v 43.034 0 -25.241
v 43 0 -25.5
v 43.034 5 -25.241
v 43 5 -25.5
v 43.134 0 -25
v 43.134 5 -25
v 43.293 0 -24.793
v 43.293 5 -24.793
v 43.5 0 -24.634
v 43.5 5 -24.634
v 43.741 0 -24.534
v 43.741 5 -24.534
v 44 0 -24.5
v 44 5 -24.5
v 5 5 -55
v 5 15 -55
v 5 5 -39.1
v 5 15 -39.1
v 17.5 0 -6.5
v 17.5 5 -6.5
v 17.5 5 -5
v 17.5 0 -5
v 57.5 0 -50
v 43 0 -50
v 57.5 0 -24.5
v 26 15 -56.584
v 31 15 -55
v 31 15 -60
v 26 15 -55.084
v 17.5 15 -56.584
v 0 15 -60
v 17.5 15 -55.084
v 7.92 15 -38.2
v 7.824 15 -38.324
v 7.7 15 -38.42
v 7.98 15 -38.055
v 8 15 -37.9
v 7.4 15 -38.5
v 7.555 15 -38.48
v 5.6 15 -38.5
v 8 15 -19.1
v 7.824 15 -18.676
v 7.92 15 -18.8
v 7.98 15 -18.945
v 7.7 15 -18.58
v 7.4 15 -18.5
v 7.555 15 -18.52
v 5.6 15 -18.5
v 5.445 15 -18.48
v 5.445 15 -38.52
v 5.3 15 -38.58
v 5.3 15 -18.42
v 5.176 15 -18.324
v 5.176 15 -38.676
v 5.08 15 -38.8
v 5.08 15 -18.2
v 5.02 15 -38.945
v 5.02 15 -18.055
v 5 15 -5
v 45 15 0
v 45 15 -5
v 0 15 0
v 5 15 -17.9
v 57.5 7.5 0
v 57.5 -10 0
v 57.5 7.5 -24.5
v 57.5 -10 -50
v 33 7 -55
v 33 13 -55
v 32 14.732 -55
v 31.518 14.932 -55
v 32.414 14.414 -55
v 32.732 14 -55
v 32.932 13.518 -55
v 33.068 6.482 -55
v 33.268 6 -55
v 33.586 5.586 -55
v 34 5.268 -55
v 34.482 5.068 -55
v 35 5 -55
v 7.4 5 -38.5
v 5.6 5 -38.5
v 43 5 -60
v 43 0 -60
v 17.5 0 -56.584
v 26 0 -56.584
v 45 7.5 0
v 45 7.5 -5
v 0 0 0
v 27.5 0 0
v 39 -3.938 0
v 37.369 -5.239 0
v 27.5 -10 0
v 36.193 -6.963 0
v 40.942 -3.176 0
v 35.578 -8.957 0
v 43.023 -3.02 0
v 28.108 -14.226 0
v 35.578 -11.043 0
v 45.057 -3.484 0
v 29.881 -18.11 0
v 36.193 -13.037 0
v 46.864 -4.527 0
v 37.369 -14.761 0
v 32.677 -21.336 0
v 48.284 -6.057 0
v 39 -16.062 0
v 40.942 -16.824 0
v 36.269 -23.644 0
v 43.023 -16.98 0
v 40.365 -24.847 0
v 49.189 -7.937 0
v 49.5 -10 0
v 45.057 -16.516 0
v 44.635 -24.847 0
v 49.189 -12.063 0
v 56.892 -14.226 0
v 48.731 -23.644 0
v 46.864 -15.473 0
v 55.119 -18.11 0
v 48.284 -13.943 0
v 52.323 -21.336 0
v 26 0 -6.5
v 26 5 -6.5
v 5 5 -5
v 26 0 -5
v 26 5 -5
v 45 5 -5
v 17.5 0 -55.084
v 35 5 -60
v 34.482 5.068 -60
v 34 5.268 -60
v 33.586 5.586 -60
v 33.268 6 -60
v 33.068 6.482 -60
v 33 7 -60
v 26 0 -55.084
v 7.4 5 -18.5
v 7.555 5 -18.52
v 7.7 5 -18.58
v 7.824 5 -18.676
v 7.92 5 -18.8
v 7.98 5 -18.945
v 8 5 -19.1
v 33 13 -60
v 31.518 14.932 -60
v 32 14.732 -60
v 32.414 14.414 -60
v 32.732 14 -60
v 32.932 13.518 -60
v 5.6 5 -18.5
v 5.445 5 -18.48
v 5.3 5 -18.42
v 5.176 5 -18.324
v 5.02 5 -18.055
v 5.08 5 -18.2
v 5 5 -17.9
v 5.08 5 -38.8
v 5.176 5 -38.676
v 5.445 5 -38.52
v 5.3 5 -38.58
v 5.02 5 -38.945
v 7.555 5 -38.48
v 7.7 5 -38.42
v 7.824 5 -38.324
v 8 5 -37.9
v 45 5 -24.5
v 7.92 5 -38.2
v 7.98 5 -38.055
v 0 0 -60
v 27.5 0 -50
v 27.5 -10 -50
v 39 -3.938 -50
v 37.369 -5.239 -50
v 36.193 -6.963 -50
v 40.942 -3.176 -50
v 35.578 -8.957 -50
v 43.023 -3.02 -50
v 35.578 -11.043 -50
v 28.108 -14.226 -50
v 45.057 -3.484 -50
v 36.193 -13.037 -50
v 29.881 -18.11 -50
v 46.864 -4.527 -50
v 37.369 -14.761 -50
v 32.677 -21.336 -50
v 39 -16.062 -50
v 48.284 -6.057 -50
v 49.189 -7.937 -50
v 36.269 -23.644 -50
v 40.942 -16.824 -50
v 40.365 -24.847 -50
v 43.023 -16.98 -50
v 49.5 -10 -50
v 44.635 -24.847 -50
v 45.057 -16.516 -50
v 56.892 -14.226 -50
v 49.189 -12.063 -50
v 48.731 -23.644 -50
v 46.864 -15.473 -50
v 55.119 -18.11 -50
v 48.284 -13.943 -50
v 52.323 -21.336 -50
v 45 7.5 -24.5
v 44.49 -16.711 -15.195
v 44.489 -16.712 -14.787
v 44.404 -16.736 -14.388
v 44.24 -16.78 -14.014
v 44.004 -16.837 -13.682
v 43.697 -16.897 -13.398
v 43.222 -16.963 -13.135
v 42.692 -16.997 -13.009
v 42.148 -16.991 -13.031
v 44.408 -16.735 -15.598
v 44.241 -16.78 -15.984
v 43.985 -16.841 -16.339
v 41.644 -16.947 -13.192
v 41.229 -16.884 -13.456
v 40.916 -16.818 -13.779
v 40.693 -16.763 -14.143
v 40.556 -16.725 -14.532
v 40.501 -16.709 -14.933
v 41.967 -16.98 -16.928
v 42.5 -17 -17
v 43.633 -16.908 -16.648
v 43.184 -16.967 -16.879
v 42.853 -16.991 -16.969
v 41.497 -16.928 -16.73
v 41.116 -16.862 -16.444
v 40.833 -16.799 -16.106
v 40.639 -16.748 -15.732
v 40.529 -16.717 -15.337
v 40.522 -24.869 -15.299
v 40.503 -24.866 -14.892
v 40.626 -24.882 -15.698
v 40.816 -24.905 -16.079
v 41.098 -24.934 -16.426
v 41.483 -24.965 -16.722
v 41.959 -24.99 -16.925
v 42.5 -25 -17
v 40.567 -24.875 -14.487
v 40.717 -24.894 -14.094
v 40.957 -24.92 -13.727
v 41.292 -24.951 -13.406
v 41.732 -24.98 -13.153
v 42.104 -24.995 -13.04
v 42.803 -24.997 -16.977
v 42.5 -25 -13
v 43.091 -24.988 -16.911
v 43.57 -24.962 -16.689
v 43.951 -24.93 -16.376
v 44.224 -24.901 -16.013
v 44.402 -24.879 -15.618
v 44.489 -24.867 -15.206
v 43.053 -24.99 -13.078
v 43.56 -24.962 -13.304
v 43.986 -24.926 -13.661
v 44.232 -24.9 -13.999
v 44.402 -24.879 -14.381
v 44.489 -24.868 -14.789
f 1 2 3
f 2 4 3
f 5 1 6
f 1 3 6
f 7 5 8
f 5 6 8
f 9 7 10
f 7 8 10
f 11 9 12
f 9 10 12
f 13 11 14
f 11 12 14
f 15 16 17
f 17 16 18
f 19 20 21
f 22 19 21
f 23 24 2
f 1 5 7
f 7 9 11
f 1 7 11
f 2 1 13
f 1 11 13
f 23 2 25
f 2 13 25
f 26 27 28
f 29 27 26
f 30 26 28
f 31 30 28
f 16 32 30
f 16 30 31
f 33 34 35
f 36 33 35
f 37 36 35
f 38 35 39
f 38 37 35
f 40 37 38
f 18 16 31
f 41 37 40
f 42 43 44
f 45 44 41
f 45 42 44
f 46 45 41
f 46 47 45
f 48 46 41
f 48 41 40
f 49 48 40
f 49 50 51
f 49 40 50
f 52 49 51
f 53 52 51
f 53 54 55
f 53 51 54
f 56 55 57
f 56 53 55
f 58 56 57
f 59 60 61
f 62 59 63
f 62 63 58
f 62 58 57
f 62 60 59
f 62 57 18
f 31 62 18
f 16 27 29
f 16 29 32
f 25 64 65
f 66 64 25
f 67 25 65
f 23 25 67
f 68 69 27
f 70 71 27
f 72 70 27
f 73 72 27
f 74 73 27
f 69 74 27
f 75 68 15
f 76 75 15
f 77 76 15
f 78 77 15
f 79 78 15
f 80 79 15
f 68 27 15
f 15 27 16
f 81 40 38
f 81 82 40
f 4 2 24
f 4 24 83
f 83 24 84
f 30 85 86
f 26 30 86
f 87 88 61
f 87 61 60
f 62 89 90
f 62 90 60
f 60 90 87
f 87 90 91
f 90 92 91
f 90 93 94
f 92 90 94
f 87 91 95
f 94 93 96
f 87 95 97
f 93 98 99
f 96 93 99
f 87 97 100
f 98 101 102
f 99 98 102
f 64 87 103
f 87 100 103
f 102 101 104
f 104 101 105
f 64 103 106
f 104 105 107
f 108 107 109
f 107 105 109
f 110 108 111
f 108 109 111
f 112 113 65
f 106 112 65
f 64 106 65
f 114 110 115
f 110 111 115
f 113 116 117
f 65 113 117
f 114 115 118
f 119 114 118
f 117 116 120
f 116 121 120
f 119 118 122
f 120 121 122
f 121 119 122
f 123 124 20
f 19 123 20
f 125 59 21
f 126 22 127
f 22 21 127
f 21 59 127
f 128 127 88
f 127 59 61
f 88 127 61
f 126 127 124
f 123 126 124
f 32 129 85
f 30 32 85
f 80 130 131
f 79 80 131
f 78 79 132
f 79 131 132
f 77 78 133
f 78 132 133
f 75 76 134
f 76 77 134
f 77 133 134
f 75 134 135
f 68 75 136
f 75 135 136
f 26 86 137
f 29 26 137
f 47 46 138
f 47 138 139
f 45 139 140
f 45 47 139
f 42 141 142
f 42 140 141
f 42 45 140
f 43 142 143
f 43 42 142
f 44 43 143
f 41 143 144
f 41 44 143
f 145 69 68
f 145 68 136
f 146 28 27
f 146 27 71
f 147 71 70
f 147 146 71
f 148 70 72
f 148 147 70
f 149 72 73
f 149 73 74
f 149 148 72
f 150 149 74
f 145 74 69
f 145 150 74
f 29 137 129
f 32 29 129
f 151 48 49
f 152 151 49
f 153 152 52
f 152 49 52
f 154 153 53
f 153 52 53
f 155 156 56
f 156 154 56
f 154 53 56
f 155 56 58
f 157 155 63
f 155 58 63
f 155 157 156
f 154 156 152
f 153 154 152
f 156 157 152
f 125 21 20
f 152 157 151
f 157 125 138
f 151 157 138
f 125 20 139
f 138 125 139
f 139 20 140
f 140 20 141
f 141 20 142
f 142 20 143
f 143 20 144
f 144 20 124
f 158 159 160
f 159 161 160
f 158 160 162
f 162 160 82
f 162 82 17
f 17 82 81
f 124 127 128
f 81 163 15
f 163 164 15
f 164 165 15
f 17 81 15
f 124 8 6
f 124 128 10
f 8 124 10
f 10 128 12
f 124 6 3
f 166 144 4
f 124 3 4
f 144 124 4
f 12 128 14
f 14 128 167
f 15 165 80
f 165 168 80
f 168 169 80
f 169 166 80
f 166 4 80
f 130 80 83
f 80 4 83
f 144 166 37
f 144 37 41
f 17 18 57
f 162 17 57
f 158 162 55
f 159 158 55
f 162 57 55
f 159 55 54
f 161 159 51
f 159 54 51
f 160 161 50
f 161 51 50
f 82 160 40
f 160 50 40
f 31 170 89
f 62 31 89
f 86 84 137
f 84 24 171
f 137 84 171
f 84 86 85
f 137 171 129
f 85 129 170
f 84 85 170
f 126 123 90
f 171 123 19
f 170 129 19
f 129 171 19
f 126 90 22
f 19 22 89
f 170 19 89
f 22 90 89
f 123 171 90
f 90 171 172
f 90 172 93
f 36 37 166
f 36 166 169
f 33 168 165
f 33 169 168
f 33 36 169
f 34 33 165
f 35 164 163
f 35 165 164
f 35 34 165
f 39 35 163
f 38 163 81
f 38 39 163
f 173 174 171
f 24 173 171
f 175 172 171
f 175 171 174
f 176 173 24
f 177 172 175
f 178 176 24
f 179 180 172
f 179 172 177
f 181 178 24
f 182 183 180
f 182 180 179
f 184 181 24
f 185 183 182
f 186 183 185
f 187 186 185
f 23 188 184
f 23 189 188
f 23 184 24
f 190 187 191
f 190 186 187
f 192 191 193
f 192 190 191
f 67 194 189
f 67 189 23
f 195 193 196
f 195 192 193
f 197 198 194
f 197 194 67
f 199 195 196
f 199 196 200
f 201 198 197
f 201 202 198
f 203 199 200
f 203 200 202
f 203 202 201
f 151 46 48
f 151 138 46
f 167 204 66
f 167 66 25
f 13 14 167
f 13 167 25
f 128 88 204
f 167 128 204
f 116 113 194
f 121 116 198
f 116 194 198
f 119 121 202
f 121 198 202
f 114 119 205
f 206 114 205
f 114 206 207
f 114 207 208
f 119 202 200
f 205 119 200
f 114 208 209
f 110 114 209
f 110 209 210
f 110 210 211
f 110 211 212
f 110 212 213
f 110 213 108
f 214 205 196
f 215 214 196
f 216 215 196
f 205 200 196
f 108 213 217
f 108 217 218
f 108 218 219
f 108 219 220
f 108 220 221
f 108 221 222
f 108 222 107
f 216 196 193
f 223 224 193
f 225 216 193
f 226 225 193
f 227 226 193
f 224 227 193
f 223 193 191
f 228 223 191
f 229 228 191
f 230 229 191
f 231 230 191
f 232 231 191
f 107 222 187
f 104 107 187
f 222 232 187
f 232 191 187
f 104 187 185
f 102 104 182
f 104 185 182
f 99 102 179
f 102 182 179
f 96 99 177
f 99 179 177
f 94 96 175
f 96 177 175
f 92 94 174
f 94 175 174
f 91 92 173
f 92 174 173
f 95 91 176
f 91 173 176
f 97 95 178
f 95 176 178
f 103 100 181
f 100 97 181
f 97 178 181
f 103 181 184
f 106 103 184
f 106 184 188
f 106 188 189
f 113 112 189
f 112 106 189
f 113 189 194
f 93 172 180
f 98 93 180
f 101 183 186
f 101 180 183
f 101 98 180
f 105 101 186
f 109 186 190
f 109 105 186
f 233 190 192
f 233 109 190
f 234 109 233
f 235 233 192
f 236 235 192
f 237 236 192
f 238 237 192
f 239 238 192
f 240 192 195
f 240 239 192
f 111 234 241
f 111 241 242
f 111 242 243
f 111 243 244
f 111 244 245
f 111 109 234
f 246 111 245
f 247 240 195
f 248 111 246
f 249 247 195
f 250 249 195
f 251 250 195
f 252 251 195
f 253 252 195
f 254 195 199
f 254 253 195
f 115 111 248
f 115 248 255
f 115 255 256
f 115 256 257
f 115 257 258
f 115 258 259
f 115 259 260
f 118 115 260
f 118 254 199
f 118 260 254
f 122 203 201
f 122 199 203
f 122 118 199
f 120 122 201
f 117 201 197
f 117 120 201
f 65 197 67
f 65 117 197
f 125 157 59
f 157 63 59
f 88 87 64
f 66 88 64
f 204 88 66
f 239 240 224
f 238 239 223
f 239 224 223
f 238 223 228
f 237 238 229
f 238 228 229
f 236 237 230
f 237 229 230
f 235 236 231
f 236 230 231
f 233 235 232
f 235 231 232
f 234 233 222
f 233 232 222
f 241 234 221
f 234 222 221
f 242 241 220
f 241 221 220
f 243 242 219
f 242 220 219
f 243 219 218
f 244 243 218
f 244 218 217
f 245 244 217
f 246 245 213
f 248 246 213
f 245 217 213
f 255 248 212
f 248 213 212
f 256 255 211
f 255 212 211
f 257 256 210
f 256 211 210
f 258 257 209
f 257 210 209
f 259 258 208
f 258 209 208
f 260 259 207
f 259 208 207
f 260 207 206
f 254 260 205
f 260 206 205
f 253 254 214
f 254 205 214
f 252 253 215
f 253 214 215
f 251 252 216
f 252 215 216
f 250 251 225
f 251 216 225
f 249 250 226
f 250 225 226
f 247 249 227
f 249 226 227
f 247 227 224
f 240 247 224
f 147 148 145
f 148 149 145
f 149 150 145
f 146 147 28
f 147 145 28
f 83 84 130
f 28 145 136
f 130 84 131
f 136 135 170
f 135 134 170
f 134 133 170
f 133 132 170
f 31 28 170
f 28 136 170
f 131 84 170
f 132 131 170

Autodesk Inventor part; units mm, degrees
ref_plane "YZ Plane" through (0, 0, 0) normal (1, 0, 0) x (0, 1, 0)
ref_plane "XZ Plane" through (0, 0, 0) normal (0, 1, 0) x (-1, 0, 0)
sketch "Sketch1" plane through (0, 0, 0) normal (0, 1, 0) x (-1, 0, 0)
  line L0 (0, 0) -> (0, -60)
  line L1 (0, 0) -> (-50, 0)
  line L2 (-5, -60) -> (-5, -5)
  line L3 (-5, -5) -> (-50, -5)
  line L4 (-47.5, 69.0442) -> (-47.5, -71.5611) construction
  line L5 (-50, 0) -> (-55, 0)
  line L6 (-55, 0) -> (-55, -50)
  line L7 (-55, -50) -> (-75, -50)
  line L8 (-75, -50) -> (-75, -60)
  line L9 (-75, -60) -> (-45, -60)
  line L10 (-5, -60) -> (-21, -60)
  circle A0 centre (-47.5, -73.124) radius 8.5
  line L11 (16.7028, -43.5) -> (-102.7124, -43.5) construction
  line L12 (-45, -26.5) -> (-50, -26.5)
  line L13 (-50, -26.5) -> (-50, -60.5)
  line L14 (-50, -60.5) -> (-45, -60.5)
  line L15 (-45, -60.5) -> (-45, -26.5)
  line L16 (-45, -43.5) -> (-50, -43.5) construction
  line L17 (-21, -60) -> (-21, -67.124)
  line L18 (-21, -67.124) -> (-30, -67.124)
  line L19 (-39, -67.124) -> (-39, -60)
  line L20 (-39, -60) -> (-45, -60) construction
  line L21 (-15.952, -100.4576) -> (-35.952, -100.4576)
  line L22 (-35.952, -108.4576) -> (-15.952, -108.4576)
  line L23 (-15.952, -108.4576) -> (-15.952, -100.4576)
  line L24 (-15.952, -73.124) -> (-76.4965, -73.124) construction
  line L25 (-30, -57.9879) -> (-30, -83.8601) construction
  line L26 (-25.952, -100.4576) -> (-25.952, -108.4576) construction
  line L27 (-45, -31) -> (-50, -31) construction
  line L28 (-50, -31) -> (-50, -56)
  line L29 (-50, -56) -> (-45, -56) construction
  line L30 (-45, -56) -> (-45, -31)
  line L31 (-45, -56) -> (-50, -56)
  line L32 (-45, -65.1391) -> (-45, -56)
  line L33 (-45, -56) -> (-50, -56)
  line L34 (-50, -56) -> (-50, -65)
  line L35 (-50, -65) -> (-45, -65)
  line L36 (-45, -65) -> (-45, -56)
  arc A1 (-35.952, -108.4576) -> (-35.952, -100.4576) centre (-43.452, -104.4576) ccw
  line L37 (-30, -67.124) -> (-39, -67.124)
  point P0 (-47.5, -43.5)
  point P1 (-30, -73.124)
  dimension "d9" = 17
  dimension "d0" = 60
  dimension "d1" = 50
  dimension "d2" = 5
  dimension "d3" = 47.5
  dimension "d4" = 5
  dimension "d5" = 50
  dimension "d6" = 20
  dimension "d7" = 30
  dimension "d10" = 38.5
  dimension "d11" = 5
  dimension "d12" = 34
  dimension "d13" = 20
  dimension "d14" = 8
  dimension "d57" = 25
  dimension "d58" = 4.5
  dimension "d59" = 5
  dimension "d60" = 9
  dimension "d61" = 17
  dimension "d62" = 9
  dimension "d63" = 9
  dimension "d64" = 9
  dimension "d65" = 6
sketch "Sketch2" plane through (0, 0, 0) normal (0, 1, 0) x (-1, 0, 0)
  line L0 (0, 0) -> (-45, 0)
  line L1 (-45, -60) -> (0, -60)
  line L2 (0, -60) -> (0, 0)
  line L3 (-5, -60) -> (-21, -60) projected
  line L4 (-30, -67.124) -> (-39, -67.124) projected
  line L5 (-57.5, -67.124) -> (-72, -67.124)
  line L6 (-72, -67.124) -> (-72, -59.124)
  line L7 (-72, -59.124) -> (-60, -59.124)
  line L8 (-60, -59.124) -> (-60, 0)
  line L9 (-57.5, -67.124) -> (-57.5, -60)
  line L10 (-45, -60.5) -> (-45, -26.5) projected
  line L11 (-45, -60) -> (-45, 0)
  point P0 (-60, -55)
  point P1 (-60, -67.124)
  dimension "d16" = 57.5
  dimension "d73" = 8
extrude "Extrusion1" add sketch "Sketch2" along normal blind 15
sketch "Sketch3" plane through (0, 15, 0) normal (0, 1, 0) x (1, 0, 0)
  line L0 (5, 5) -> (55, 5)
  line L1 (55, 5) -> (55, 55)
  line L2 (55, 55) -> (5, 55)
  line L3 (5, 55) -> (5, 5)
  line L4 (0, 0) -> (45, 0) projected
  line L5 (0, 60) -> (0, 0) projected
  point P0 (60, 0)
  dimension "d23" = 5
  dimension "d24" = 5
  dimension "d25" = 50
  dimension "d26" = 50
extrude "Extrusion2" cut sketch "Sketch3" against normal blind 10
sketch "Sketch5" plane through (0, 0, 0) normal (0, -1, 0) x (1, 0, 0)
  line L0 (45, -60) -> (0, -60) projected
  line L1 (45, -60.5) -> (45, -26.5) projected
  line L2 (5, -60) -> (5, -5) projected
  line L3 (50, -26.5) -> (50, -60.5) projected
  line L4 (45, -26.5) -> (50, -26.5) projected
  line L5 (50, -60.5) -> (45, -60.5) projected
  line L6 (52, -60) -> (52, -24.5)
  line L7 (52, -24.5) -> (43, -24.5)
  line L8 (43, -24.5) -> (43, -60)
  line L9 (52, -60.5) -> (52, -60)
  line L10 (52, -60) -> (43, -60)
  point P0 (80, -60)
  point P1 (57.5, -60)
  dimension "d30" = 40
  dimension "d31" = 2
extrude "Extrusion3" cut sketch "Sketch5" against normal through all contours L0 L8 L7 L6 L10 L3 L4 L1 | L1 L4 L3 L10
sketch "Sketch8" plane through (0, 5, 0) normal (0, 1, 0) x (1, 0, 0)
  line L0 (36, 11.5) -> (39, 11.5)
  line L1 (39, 11.5) -> (39, 43.5)
  line L2 (39, 43.5) -> (36, 43.5)
  line L3 (36, 43.5) -> (36, 11.5)
  line L4 (45, 60.5) -> (45, 26.5) projected
  line L5 (-16.7028, 43.5) -> (102.7124, 43.5) construction
  point P0 (0, 0)
  point P1 (47.5, 43.5)
  dimension "d45" = 6
  dimension "d46" = 32
  dimension "d47" = 3
extrude "Extrusion5" [suppressed]
sketch "Sketch9" plane through (0, 5, 0) normal (0, 1, 0) x (1, 0, 0)
  line L0 (36, 43.5) -> (39, 43.5) projected
  line L1 (5, 5) -> (5, 55) projected
  line L2 (8, 18.5) -> (5, 18.5)
  line L3 (5, 18.5) -> (5, 38.5)
  line L4 (5, 38.5) -> (8, 38.5)
  line L5 (8, 38.5) -> (8, 18.5)
  point P0 (0, 0)
  dimension "d50" = 3
  dimension "d51" = 5
  dimension "d52" = 20
extrude "Extrusion6" add sketch "Sketch9" along normal up to surface (10 mm away)
fillet "Fillet1" radius 0.6 4 edges at (5, 10, -38.5) (8, 10, -38.5) (8, 10, -18.5) (5, 10, -18.5)
fillet "Fillet2" radius 1 1 edges at (43, 2.5, -24.5)
sketch "Sketch15" plane through (0, 0, 0) normal (0, -1, 0) x (1, 0, 0)
  line L0 (0, 0) -> (45, 0) projected
  line L1 (27.5, 0) -> (57.5, 0)
  line L2 (57.5, 0) -> (57.5, -50)
  line L3 (57.5, -50) -> (27.5, -50)
  line L4 (27.5, -50) -> (27.5, 0)
  line L5 (42.5, -50) -> (42.5, 0) construction
  line L6 (47.5, 69.0442) -> (47.5, -71.5611) construction
  line L7 (0, -60) -> (0, 0) projected
  dimension "d87" = 30
  dimension "d90" = 50
  dimension "d127" = 27.5
extrude "Extrusion11" add sketch "Sketch15" along normal blind 10
sketch "Sketch17" plane through (45, 5, -5) normal (1, 0, 0) x (0, 0, -1)
  line L0 (-5, -5) -> (-5, 10) projected
  line L1 (-5, -5) -> (19.5, -5) projected
  line L2 (-5, 2.5) -> (19.5, 2.5)
  line L3 (19.5, 2.5) -> (19.5, -5)
  line L4 (19.5, -5) -> (-5, -5)
  line L5 (-5, -5) -> (-5, 2.5)
extrude "Extrusion13" add sketch "Sketch17" along normal up to surface (12.5 mm away)
sketch "Sketch18" plane through (0, -10, 0) normal (0, -1, 0) x (1, 0, 0)
  line L0 (27.5, -50) -> (57.5, -50) projected
  line L1 (57.5, 0) -> (27.5, 0) projected
  line L2 (42.5, 0) -> (42.5, -50) construction
  line L3 (43, -50) -> (57.5, -50) projected
  line L4 (57.5, 0) -> (49.5, 0)
  line L5 (49.5, 0) -> (49.5, -50)
  line L6 (49.5, -50) -> (57.5, -50)
  line L7 (57.5, -50) -> (57.5, 0)
  point P0 (0, 0)
  dimension "d95" = 7
revolve "Revolution1" add sketch "Sketch18" angle 180 about axis through (42.5, -10, 0) along (0, 0, -1)
hole "Hole2" at (42.5, -10, 0) direction (0, 0, -1) diameter 14 end through all
ref_plane "Work Plane2" through (42.5, -25, -25) normal (0, -1, 0) x (1, 0, 0)
sketch "Sketch19" plane through (42.5, -25, -25) normal (0, -1, 0) x (1, 0, 0)
  line L0 (-15, 25) -> (-15, -25) projected
  line L1 (15, -25) -> (-15, -25) projected
  line L2 (15, -25) -> (15, 25) projected
  line L3 (15, 25) -> (-15, 25) projected
  line L4 (0, 10) -> (-15, 10)
  line L5 (-15, -25) -> (-15, 25) projected
  line L6 (0, 10) -> (15, 10)
  point P0 (-42.5, 25)
  dimension "d106" = 15
hole "Hole3" at (42.5, -25, -15) direction (0, 1, 0) diameter 4 end up to surface
sketch "Sketch20" plane through (43, 0, -60) normal (1, 0, 0) x (0, 0, -1)
  line L0 (-34.5, 0) -> (-34.5, 5) projected
  line L1 (-10, 0) -> (-34.5, 0) projected
  line L2 (0, 0) -> (-34.5, 0) projected
  line L3 (0, 15) -> (0, 0) projected
  line L4 (-5, 15) -> (0, 15) projected
  line L5 (-5, 5) -> (-5, 15) projected
  line L6 (-34.5, 5) -> (-5, 5) projected
  line L7 (-10, -3) -> (-10, -17) projected
  line L8 (-10, -10) -> (-60, -10) projected
  line L9 (-5, 5) -> (-55, 5)
  line L10 (-55, 5) -> (-55, 31)
  line L11 (-55, 31) -> (-5, 31)
  line L12 (-5, 31) -> (-5, 5)
  circle A0 centre (-16, 23) radius 11
  circle A1 centre (-16, 23) radius 18
  point P0 (-60, 0)
  dimension "d114" = 50
  dimension "d115" = 26
  dimension "d116" = 22
  dimension "d117" = 33
  dimension "d129" = 36
sketch "Sketch21" plane through (43, 0, -60) normal (1, 0, 0) x (0, 0, -1)
  line L0 (-5, 15) -> (0, 15) projected
  line L1 (-5, 5) -> (-5, 15) projected
  line L2 (-20.9, 5) -> (-5, 5) projected
  line L3 (0, 5) -> (0, 15)
  line L4 (0, 15) -> (-5, 15)
  line L5 (-5, 15) -> (-5, 5)
  line L6 (-5, 5) -> (0, 5)
  point P0 (-60, 0)
extrude "Extrusion14" cut sketch "Sketch21" against normal blind 10
fillet "Fillet3" radius 2 2 edges at (33, 5, -57.5) (33, 15, -57.5)
sketch "Sketch22" plane through (0, 5, 0) normal (0, 1, 0) x (1, 0, 0)
  line L0 (35, 55) -> (35, 60) projected
  line L1 (5, 55) -> (35, 55) projected
  line L2 (5, 39.1) -> (5, 55) projected
  arc A0 (5, 39.1) -> (5.6, 38.5) centre (5.6, 39.1) ccw projected
  line L3 (5.6, 38.5) -> (7.4, 38.5) projected
  arc A1 (8, 37.9) -> (7.4, 38.5) centre (7.4, 37.9) ccw projected
  line L4 (8, 37.9) -> (8, 19.1) projected
  arc A2 (7.4, 18.5) -> (8, 19.1) centre (7.4, 19.1) ccw projected
  line L5 (7.4, 18.5) -> (5.6, 18.5) projected
  arc A3 (5.6, 18.5) -> (5, 17.9) centre (5.6, 17.9) ccw projected
  line L6 (5, 5) -> (5, 17.9) projected
  line L7 (45, 5) -> (5, 5) projected
  line L8 (45, 0) -> (45, 5) projected
  line L9 (45, 0) -> (57.5, 0) projected
  line L10 (57.5, 0) -> (57.5, 24.5) projected
  line L11 (57.5, 24.5) -> (44, 24.5) projected
  arc A4 (43, 25.5) -> (44, 24.5) centre (44, 25.5) ccw projected
  line L12 (43, 60) -> (43, 25.5) projected
  line L13 (35, 60) -> (43, 60) projected
  line L14 (39, 43.5) -> (39, 11.5) projected
  line L15 (39, 11.5) -> (36, 11.5) projected
  line L16 (36, 11.5) -> (36, 43.5) projected
  line L17 (36, 43.5) -> (39, 43.5) projected
  line L18 (49.5, 0) -> (35.5, 0) projected
  line L19 (35.5, 50) -> (49.5, 50) projected
  line L20 (35.5, 50) -> (49.5, 50) projected
  line L21 (57.5, 50) -> (27.5, 50) projected
  line L22 (43, 50) -> (27.5, 50) projected
  line L23 (43, 50) -> (57.5, 50) projected
  line L24 (35.5, 50) -> (49.5, 50) projected
  line L25 (42.5, 50) -> (42.5, 0) construction
  line L26 (49.5, 0) -> (35.5, 0) projected
  line L27 (5, 55) -> (45, 55)
  line L28 (45, 55) -> (45, 5)
  line L29 (45, 5) -> (5, 5)
  line L30 (5, 5) -> (5, 55)
  line L31 (45, 55) -> (51, 55)
  line L32 (51, 55) -> (51, 33)
  line L33 (51, 33) -> (45, 33)
  line L34 (45, 33) -> (45, 55)
  line L35 (48, 55) -> (48, 33) construction
  point P0 (0, 0)
  point P1 (45, 24.5)
  dimension "d121" = 40
  dimension "d122" = 50
  dimension "d123" = 40
  dimension "d124" = 6
  dimension "d125" = 22
  dimension "d128" = 5.5
sketch "Sketch23" plane through (0, 15, 0) normal (0, 1, 0) x (1, 0, 0)
  line L0 (45, 5) -> (5, 5) projected
  line L1 (33, 55) -> (31, 55) projected
  line L2 (26, 6.5) -> (17.5, 6.5)
  line L3 (17.5, 6.5) -> (17.5, 5)
  line L4 (17.5, 5) -> (26, 5)
  line L5 (26, 5) -> (26, 6.5)
  line L6 (31, 60) -> (31, 55) projected
  line L7 (17.5, 56.5837) -> (26, 56.5837)
  line L8 (26, 56.5837) -> (26, 55.0837)
  line L9 (26, 55.0837) -> (17.5, 55.0837)
  line L10 (17.5, 55.0837) -> (17.5, 56.5837)
  dimension "d131" = 1.5
  dimension "d134" = 8.5
  dimension "d135" = 1.5
  dimension "d136" = 5
  dimension "d137" = 8.5
extrude "Extrusion15" cut sketch "Sketch23" against normal through all
properties part number "HousingV2"
